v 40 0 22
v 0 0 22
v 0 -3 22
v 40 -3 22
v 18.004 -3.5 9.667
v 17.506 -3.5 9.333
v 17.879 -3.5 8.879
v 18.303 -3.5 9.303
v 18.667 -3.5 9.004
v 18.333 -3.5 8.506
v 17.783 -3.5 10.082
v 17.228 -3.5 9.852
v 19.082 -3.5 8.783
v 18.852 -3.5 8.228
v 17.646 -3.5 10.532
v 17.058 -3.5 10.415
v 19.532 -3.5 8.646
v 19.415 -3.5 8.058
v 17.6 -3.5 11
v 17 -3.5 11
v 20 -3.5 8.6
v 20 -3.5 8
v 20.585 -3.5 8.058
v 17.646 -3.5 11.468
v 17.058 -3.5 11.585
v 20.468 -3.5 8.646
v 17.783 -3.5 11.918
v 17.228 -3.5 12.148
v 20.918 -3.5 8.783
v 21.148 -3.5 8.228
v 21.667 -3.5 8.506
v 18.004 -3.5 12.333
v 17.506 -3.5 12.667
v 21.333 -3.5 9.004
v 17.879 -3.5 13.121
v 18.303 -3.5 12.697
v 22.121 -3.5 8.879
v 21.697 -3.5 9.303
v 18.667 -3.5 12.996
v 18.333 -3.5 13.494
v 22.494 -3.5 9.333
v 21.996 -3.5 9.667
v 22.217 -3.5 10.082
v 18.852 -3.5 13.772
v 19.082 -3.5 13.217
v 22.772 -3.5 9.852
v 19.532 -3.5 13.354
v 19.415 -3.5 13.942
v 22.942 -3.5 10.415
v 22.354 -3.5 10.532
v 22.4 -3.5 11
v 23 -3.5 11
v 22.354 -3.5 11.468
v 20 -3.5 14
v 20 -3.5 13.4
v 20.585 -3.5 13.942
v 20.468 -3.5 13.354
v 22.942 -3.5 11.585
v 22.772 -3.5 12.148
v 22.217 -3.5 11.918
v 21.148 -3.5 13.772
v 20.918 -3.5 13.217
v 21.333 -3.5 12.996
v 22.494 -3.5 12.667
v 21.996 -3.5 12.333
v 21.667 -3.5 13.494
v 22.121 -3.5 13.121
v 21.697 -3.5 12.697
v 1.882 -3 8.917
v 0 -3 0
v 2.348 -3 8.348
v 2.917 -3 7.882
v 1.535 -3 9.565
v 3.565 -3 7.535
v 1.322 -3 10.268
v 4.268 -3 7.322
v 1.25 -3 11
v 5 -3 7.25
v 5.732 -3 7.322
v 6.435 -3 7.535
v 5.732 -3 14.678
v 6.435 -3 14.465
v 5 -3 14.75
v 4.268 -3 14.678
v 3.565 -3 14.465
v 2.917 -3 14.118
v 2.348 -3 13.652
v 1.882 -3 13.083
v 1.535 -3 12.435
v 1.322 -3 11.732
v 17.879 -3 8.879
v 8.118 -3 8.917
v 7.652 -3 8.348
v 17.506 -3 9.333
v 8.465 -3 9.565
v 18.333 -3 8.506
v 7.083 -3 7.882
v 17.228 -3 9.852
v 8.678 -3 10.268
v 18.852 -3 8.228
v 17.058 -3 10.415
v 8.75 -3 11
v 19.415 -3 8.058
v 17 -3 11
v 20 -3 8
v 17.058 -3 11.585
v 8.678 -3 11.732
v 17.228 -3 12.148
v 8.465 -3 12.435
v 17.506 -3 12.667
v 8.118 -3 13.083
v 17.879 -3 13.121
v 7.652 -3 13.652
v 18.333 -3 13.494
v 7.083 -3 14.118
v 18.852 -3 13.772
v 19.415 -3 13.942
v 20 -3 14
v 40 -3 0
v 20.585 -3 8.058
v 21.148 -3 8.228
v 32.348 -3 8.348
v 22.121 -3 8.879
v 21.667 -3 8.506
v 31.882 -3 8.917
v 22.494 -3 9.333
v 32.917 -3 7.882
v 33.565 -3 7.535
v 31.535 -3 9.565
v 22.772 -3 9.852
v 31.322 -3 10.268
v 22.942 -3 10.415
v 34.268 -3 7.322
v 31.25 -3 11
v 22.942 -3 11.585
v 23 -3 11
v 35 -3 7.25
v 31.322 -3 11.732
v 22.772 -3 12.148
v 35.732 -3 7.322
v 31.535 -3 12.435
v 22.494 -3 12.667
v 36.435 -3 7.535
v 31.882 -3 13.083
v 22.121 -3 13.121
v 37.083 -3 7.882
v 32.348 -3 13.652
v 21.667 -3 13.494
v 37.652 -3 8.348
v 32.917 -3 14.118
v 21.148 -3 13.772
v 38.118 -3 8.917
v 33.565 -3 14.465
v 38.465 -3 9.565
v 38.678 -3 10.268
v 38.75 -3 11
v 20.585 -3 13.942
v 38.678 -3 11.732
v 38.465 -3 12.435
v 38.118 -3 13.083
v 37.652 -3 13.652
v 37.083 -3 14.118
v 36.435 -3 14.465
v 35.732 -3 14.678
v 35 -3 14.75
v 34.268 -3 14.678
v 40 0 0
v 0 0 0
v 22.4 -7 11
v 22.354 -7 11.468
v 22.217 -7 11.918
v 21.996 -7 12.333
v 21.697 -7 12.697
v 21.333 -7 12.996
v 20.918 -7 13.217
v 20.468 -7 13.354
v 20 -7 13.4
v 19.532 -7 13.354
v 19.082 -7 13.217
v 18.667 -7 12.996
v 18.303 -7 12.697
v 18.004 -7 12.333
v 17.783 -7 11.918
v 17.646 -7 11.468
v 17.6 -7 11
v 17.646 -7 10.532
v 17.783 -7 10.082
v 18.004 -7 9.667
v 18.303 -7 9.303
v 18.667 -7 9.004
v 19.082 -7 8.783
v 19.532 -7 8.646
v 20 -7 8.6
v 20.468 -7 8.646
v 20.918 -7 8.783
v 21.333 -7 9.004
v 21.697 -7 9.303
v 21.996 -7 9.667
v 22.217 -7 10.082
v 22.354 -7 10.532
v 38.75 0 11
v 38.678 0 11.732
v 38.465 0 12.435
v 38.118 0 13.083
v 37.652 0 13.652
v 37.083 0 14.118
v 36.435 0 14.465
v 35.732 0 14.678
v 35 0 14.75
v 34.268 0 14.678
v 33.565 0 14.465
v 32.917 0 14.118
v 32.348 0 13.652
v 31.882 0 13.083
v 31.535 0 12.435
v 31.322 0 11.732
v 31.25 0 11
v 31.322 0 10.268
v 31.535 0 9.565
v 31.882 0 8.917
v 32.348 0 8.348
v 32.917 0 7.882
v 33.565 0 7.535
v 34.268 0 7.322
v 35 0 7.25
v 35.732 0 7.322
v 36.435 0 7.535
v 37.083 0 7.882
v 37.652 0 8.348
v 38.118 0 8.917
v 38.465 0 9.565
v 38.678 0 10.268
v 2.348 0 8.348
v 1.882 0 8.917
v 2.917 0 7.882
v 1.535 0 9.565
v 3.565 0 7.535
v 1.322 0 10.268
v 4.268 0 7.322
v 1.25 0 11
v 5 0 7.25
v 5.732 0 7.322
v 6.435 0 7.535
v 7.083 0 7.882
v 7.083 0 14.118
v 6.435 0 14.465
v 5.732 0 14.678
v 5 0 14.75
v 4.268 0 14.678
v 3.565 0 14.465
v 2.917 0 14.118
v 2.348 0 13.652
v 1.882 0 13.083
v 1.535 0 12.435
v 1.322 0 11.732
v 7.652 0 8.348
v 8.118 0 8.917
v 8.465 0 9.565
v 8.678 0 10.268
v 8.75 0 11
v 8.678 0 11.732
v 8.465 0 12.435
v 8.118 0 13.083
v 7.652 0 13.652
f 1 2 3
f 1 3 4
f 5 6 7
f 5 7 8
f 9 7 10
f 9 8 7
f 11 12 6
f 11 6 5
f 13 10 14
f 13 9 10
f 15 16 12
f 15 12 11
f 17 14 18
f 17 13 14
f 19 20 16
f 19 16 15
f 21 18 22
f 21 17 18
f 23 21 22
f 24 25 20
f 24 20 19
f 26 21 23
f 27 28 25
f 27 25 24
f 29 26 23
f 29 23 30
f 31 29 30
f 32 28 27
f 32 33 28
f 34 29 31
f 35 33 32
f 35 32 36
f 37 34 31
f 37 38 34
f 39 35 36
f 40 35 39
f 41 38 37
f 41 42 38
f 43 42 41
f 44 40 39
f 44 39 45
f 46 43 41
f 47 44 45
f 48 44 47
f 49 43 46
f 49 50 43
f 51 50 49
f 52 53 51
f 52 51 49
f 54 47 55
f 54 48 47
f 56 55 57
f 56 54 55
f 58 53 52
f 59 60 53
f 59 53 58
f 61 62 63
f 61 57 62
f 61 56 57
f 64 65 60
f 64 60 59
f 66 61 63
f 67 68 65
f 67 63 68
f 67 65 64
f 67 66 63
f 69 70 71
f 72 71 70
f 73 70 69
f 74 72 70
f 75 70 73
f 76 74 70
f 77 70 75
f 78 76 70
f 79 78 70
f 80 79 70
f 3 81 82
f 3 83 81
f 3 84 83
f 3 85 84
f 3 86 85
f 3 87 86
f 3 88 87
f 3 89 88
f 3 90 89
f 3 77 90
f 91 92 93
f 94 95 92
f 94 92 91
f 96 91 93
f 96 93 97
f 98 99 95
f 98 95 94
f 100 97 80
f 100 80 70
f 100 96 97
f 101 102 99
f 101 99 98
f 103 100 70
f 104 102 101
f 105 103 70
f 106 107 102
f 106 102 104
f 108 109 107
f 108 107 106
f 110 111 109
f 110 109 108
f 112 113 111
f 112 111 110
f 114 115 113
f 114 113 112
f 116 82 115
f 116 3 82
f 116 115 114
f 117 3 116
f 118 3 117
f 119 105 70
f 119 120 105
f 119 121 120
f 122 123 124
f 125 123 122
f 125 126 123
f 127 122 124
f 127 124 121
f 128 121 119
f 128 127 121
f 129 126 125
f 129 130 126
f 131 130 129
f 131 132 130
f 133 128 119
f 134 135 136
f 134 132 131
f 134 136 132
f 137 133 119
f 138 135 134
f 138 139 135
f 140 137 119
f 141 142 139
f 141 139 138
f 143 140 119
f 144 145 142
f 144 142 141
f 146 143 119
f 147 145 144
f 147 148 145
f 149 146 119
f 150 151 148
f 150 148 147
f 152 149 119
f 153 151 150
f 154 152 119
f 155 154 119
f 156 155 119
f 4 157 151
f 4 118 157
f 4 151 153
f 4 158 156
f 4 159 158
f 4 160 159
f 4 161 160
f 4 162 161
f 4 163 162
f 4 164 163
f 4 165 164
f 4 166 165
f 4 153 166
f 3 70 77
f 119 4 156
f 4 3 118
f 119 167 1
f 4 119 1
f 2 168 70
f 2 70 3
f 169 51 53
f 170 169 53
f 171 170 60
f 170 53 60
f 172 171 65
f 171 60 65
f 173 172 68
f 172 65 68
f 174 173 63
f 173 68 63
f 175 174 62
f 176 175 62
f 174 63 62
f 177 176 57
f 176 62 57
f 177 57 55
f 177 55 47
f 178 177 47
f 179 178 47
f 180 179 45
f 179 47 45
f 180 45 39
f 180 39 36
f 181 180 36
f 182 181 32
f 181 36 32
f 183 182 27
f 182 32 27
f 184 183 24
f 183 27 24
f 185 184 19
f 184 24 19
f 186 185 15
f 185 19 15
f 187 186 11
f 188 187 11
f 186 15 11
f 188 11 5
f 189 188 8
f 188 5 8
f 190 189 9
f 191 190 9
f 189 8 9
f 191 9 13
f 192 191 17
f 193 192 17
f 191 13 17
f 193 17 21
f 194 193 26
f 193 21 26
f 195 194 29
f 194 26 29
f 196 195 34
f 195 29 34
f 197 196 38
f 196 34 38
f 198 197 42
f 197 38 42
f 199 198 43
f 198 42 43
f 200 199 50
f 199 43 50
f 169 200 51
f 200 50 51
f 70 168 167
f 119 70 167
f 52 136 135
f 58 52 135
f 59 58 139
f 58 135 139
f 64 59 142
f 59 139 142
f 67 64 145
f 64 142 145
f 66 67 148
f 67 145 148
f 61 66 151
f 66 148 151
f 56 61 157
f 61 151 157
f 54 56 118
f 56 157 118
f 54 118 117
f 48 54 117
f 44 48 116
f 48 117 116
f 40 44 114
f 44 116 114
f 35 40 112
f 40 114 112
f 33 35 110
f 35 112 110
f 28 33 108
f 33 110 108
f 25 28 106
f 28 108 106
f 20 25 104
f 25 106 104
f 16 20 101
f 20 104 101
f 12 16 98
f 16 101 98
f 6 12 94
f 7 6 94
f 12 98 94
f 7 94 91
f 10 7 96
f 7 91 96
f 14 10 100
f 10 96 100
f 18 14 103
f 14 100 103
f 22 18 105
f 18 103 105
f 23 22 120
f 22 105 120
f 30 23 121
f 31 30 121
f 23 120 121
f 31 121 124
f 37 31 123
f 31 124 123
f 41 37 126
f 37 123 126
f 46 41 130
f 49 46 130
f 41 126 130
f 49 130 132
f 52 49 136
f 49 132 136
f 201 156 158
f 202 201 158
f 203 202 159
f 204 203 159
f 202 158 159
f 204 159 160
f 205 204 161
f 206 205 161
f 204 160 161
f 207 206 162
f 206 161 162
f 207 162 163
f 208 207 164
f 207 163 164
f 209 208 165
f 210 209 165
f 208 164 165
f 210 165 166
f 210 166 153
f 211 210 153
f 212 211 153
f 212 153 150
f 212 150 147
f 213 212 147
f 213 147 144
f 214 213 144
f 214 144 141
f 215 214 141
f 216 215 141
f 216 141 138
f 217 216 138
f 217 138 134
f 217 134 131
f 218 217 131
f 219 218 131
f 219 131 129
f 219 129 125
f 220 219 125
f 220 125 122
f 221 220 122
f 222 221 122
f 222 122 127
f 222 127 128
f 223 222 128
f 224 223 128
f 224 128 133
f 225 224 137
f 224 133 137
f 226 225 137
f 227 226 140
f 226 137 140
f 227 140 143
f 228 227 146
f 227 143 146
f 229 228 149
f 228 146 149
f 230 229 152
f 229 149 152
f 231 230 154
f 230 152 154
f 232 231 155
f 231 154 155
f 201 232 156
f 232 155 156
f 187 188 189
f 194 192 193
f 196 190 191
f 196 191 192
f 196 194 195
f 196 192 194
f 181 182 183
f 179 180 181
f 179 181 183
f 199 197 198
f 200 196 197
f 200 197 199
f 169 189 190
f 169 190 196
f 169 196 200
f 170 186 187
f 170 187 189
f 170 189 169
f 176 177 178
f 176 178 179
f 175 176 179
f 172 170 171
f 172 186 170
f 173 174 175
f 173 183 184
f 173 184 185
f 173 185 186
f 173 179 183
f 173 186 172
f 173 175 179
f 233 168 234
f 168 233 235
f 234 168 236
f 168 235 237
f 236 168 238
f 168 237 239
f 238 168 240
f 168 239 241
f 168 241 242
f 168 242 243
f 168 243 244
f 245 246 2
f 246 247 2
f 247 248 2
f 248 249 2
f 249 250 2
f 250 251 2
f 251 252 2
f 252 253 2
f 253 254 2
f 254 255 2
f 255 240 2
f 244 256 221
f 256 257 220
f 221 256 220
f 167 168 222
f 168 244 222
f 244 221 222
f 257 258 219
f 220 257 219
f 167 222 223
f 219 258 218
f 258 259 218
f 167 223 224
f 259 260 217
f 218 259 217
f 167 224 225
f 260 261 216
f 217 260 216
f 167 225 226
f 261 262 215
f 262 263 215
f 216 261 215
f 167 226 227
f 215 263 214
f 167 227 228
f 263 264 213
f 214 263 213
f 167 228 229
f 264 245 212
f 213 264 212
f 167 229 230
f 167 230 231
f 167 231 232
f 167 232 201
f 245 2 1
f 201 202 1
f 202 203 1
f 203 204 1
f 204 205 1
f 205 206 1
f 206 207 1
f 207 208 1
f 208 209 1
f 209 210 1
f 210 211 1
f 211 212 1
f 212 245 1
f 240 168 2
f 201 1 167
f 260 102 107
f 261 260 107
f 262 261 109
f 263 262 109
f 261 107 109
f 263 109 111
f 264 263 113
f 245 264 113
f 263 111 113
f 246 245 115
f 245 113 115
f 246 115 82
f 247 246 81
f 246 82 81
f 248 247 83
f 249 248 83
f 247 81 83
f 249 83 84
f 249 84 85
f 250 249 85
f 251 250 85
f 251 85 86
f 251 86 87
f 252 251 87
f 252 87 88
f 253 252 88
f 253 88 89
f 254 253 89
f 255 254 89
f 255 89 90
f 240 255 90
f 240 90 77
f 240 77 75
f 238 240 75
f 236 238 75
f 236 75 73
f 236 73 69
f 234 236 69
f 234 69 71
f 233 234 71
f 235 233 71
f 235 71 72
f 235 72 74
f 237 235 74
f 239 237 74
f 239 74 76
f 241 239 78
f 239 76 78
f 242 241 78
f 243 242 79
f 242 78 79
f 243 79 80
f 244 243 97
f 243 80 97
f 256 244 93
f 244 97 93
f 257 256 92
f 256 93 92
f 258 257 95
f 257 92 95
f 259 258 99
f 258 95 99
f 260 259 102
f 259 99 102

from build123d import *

# Parameters (mm, degrees)
F0_W     = 40
F0_H     = 22
F1_DEPTH = 3
F2_R     = 3
F3_DEPTH = 0.5
F4_R     = 2.4
F5_DEPTH = 3.5
F6_R     = 3.75
F7_DEPTH = 25


with BuildPart() as f1:
    # F0 (on Front) → F1 (new body)
    with BuildSketch(Plane.XZ):
        with Locations((20, 11)):
            Rectangle(F0_W, F0_H)
    extrude(amount=F1_DEPTH)

    # F2 (on face) → F3 (join)
    with BuildSketch(Plane.XZ.offset(3)):
        with Locations((20, 11)):
            Circle(F2_R)
    extrude(amount=F3_DEPTH)

    # F4 (on face) → F5 (join)
    with BuildSketch(Plane.XZ.offset(3.5)):
        with Locations((20, 11)):
            Circle(F4_R)
    extrude(amount=F5_DEPTH)

    # F6 (on face) → F7 (cut)
    with BuildSketch(Plane.XZ.offset(3)):
        with Locations((5, 11)):
            Circle(F6_R)
        with Locations((35, 11)):
            Circle(F6_R)
    extrude(amount=-F7_DEPTH, mode=Mode.SUBTRACT)


solid = f1.part
